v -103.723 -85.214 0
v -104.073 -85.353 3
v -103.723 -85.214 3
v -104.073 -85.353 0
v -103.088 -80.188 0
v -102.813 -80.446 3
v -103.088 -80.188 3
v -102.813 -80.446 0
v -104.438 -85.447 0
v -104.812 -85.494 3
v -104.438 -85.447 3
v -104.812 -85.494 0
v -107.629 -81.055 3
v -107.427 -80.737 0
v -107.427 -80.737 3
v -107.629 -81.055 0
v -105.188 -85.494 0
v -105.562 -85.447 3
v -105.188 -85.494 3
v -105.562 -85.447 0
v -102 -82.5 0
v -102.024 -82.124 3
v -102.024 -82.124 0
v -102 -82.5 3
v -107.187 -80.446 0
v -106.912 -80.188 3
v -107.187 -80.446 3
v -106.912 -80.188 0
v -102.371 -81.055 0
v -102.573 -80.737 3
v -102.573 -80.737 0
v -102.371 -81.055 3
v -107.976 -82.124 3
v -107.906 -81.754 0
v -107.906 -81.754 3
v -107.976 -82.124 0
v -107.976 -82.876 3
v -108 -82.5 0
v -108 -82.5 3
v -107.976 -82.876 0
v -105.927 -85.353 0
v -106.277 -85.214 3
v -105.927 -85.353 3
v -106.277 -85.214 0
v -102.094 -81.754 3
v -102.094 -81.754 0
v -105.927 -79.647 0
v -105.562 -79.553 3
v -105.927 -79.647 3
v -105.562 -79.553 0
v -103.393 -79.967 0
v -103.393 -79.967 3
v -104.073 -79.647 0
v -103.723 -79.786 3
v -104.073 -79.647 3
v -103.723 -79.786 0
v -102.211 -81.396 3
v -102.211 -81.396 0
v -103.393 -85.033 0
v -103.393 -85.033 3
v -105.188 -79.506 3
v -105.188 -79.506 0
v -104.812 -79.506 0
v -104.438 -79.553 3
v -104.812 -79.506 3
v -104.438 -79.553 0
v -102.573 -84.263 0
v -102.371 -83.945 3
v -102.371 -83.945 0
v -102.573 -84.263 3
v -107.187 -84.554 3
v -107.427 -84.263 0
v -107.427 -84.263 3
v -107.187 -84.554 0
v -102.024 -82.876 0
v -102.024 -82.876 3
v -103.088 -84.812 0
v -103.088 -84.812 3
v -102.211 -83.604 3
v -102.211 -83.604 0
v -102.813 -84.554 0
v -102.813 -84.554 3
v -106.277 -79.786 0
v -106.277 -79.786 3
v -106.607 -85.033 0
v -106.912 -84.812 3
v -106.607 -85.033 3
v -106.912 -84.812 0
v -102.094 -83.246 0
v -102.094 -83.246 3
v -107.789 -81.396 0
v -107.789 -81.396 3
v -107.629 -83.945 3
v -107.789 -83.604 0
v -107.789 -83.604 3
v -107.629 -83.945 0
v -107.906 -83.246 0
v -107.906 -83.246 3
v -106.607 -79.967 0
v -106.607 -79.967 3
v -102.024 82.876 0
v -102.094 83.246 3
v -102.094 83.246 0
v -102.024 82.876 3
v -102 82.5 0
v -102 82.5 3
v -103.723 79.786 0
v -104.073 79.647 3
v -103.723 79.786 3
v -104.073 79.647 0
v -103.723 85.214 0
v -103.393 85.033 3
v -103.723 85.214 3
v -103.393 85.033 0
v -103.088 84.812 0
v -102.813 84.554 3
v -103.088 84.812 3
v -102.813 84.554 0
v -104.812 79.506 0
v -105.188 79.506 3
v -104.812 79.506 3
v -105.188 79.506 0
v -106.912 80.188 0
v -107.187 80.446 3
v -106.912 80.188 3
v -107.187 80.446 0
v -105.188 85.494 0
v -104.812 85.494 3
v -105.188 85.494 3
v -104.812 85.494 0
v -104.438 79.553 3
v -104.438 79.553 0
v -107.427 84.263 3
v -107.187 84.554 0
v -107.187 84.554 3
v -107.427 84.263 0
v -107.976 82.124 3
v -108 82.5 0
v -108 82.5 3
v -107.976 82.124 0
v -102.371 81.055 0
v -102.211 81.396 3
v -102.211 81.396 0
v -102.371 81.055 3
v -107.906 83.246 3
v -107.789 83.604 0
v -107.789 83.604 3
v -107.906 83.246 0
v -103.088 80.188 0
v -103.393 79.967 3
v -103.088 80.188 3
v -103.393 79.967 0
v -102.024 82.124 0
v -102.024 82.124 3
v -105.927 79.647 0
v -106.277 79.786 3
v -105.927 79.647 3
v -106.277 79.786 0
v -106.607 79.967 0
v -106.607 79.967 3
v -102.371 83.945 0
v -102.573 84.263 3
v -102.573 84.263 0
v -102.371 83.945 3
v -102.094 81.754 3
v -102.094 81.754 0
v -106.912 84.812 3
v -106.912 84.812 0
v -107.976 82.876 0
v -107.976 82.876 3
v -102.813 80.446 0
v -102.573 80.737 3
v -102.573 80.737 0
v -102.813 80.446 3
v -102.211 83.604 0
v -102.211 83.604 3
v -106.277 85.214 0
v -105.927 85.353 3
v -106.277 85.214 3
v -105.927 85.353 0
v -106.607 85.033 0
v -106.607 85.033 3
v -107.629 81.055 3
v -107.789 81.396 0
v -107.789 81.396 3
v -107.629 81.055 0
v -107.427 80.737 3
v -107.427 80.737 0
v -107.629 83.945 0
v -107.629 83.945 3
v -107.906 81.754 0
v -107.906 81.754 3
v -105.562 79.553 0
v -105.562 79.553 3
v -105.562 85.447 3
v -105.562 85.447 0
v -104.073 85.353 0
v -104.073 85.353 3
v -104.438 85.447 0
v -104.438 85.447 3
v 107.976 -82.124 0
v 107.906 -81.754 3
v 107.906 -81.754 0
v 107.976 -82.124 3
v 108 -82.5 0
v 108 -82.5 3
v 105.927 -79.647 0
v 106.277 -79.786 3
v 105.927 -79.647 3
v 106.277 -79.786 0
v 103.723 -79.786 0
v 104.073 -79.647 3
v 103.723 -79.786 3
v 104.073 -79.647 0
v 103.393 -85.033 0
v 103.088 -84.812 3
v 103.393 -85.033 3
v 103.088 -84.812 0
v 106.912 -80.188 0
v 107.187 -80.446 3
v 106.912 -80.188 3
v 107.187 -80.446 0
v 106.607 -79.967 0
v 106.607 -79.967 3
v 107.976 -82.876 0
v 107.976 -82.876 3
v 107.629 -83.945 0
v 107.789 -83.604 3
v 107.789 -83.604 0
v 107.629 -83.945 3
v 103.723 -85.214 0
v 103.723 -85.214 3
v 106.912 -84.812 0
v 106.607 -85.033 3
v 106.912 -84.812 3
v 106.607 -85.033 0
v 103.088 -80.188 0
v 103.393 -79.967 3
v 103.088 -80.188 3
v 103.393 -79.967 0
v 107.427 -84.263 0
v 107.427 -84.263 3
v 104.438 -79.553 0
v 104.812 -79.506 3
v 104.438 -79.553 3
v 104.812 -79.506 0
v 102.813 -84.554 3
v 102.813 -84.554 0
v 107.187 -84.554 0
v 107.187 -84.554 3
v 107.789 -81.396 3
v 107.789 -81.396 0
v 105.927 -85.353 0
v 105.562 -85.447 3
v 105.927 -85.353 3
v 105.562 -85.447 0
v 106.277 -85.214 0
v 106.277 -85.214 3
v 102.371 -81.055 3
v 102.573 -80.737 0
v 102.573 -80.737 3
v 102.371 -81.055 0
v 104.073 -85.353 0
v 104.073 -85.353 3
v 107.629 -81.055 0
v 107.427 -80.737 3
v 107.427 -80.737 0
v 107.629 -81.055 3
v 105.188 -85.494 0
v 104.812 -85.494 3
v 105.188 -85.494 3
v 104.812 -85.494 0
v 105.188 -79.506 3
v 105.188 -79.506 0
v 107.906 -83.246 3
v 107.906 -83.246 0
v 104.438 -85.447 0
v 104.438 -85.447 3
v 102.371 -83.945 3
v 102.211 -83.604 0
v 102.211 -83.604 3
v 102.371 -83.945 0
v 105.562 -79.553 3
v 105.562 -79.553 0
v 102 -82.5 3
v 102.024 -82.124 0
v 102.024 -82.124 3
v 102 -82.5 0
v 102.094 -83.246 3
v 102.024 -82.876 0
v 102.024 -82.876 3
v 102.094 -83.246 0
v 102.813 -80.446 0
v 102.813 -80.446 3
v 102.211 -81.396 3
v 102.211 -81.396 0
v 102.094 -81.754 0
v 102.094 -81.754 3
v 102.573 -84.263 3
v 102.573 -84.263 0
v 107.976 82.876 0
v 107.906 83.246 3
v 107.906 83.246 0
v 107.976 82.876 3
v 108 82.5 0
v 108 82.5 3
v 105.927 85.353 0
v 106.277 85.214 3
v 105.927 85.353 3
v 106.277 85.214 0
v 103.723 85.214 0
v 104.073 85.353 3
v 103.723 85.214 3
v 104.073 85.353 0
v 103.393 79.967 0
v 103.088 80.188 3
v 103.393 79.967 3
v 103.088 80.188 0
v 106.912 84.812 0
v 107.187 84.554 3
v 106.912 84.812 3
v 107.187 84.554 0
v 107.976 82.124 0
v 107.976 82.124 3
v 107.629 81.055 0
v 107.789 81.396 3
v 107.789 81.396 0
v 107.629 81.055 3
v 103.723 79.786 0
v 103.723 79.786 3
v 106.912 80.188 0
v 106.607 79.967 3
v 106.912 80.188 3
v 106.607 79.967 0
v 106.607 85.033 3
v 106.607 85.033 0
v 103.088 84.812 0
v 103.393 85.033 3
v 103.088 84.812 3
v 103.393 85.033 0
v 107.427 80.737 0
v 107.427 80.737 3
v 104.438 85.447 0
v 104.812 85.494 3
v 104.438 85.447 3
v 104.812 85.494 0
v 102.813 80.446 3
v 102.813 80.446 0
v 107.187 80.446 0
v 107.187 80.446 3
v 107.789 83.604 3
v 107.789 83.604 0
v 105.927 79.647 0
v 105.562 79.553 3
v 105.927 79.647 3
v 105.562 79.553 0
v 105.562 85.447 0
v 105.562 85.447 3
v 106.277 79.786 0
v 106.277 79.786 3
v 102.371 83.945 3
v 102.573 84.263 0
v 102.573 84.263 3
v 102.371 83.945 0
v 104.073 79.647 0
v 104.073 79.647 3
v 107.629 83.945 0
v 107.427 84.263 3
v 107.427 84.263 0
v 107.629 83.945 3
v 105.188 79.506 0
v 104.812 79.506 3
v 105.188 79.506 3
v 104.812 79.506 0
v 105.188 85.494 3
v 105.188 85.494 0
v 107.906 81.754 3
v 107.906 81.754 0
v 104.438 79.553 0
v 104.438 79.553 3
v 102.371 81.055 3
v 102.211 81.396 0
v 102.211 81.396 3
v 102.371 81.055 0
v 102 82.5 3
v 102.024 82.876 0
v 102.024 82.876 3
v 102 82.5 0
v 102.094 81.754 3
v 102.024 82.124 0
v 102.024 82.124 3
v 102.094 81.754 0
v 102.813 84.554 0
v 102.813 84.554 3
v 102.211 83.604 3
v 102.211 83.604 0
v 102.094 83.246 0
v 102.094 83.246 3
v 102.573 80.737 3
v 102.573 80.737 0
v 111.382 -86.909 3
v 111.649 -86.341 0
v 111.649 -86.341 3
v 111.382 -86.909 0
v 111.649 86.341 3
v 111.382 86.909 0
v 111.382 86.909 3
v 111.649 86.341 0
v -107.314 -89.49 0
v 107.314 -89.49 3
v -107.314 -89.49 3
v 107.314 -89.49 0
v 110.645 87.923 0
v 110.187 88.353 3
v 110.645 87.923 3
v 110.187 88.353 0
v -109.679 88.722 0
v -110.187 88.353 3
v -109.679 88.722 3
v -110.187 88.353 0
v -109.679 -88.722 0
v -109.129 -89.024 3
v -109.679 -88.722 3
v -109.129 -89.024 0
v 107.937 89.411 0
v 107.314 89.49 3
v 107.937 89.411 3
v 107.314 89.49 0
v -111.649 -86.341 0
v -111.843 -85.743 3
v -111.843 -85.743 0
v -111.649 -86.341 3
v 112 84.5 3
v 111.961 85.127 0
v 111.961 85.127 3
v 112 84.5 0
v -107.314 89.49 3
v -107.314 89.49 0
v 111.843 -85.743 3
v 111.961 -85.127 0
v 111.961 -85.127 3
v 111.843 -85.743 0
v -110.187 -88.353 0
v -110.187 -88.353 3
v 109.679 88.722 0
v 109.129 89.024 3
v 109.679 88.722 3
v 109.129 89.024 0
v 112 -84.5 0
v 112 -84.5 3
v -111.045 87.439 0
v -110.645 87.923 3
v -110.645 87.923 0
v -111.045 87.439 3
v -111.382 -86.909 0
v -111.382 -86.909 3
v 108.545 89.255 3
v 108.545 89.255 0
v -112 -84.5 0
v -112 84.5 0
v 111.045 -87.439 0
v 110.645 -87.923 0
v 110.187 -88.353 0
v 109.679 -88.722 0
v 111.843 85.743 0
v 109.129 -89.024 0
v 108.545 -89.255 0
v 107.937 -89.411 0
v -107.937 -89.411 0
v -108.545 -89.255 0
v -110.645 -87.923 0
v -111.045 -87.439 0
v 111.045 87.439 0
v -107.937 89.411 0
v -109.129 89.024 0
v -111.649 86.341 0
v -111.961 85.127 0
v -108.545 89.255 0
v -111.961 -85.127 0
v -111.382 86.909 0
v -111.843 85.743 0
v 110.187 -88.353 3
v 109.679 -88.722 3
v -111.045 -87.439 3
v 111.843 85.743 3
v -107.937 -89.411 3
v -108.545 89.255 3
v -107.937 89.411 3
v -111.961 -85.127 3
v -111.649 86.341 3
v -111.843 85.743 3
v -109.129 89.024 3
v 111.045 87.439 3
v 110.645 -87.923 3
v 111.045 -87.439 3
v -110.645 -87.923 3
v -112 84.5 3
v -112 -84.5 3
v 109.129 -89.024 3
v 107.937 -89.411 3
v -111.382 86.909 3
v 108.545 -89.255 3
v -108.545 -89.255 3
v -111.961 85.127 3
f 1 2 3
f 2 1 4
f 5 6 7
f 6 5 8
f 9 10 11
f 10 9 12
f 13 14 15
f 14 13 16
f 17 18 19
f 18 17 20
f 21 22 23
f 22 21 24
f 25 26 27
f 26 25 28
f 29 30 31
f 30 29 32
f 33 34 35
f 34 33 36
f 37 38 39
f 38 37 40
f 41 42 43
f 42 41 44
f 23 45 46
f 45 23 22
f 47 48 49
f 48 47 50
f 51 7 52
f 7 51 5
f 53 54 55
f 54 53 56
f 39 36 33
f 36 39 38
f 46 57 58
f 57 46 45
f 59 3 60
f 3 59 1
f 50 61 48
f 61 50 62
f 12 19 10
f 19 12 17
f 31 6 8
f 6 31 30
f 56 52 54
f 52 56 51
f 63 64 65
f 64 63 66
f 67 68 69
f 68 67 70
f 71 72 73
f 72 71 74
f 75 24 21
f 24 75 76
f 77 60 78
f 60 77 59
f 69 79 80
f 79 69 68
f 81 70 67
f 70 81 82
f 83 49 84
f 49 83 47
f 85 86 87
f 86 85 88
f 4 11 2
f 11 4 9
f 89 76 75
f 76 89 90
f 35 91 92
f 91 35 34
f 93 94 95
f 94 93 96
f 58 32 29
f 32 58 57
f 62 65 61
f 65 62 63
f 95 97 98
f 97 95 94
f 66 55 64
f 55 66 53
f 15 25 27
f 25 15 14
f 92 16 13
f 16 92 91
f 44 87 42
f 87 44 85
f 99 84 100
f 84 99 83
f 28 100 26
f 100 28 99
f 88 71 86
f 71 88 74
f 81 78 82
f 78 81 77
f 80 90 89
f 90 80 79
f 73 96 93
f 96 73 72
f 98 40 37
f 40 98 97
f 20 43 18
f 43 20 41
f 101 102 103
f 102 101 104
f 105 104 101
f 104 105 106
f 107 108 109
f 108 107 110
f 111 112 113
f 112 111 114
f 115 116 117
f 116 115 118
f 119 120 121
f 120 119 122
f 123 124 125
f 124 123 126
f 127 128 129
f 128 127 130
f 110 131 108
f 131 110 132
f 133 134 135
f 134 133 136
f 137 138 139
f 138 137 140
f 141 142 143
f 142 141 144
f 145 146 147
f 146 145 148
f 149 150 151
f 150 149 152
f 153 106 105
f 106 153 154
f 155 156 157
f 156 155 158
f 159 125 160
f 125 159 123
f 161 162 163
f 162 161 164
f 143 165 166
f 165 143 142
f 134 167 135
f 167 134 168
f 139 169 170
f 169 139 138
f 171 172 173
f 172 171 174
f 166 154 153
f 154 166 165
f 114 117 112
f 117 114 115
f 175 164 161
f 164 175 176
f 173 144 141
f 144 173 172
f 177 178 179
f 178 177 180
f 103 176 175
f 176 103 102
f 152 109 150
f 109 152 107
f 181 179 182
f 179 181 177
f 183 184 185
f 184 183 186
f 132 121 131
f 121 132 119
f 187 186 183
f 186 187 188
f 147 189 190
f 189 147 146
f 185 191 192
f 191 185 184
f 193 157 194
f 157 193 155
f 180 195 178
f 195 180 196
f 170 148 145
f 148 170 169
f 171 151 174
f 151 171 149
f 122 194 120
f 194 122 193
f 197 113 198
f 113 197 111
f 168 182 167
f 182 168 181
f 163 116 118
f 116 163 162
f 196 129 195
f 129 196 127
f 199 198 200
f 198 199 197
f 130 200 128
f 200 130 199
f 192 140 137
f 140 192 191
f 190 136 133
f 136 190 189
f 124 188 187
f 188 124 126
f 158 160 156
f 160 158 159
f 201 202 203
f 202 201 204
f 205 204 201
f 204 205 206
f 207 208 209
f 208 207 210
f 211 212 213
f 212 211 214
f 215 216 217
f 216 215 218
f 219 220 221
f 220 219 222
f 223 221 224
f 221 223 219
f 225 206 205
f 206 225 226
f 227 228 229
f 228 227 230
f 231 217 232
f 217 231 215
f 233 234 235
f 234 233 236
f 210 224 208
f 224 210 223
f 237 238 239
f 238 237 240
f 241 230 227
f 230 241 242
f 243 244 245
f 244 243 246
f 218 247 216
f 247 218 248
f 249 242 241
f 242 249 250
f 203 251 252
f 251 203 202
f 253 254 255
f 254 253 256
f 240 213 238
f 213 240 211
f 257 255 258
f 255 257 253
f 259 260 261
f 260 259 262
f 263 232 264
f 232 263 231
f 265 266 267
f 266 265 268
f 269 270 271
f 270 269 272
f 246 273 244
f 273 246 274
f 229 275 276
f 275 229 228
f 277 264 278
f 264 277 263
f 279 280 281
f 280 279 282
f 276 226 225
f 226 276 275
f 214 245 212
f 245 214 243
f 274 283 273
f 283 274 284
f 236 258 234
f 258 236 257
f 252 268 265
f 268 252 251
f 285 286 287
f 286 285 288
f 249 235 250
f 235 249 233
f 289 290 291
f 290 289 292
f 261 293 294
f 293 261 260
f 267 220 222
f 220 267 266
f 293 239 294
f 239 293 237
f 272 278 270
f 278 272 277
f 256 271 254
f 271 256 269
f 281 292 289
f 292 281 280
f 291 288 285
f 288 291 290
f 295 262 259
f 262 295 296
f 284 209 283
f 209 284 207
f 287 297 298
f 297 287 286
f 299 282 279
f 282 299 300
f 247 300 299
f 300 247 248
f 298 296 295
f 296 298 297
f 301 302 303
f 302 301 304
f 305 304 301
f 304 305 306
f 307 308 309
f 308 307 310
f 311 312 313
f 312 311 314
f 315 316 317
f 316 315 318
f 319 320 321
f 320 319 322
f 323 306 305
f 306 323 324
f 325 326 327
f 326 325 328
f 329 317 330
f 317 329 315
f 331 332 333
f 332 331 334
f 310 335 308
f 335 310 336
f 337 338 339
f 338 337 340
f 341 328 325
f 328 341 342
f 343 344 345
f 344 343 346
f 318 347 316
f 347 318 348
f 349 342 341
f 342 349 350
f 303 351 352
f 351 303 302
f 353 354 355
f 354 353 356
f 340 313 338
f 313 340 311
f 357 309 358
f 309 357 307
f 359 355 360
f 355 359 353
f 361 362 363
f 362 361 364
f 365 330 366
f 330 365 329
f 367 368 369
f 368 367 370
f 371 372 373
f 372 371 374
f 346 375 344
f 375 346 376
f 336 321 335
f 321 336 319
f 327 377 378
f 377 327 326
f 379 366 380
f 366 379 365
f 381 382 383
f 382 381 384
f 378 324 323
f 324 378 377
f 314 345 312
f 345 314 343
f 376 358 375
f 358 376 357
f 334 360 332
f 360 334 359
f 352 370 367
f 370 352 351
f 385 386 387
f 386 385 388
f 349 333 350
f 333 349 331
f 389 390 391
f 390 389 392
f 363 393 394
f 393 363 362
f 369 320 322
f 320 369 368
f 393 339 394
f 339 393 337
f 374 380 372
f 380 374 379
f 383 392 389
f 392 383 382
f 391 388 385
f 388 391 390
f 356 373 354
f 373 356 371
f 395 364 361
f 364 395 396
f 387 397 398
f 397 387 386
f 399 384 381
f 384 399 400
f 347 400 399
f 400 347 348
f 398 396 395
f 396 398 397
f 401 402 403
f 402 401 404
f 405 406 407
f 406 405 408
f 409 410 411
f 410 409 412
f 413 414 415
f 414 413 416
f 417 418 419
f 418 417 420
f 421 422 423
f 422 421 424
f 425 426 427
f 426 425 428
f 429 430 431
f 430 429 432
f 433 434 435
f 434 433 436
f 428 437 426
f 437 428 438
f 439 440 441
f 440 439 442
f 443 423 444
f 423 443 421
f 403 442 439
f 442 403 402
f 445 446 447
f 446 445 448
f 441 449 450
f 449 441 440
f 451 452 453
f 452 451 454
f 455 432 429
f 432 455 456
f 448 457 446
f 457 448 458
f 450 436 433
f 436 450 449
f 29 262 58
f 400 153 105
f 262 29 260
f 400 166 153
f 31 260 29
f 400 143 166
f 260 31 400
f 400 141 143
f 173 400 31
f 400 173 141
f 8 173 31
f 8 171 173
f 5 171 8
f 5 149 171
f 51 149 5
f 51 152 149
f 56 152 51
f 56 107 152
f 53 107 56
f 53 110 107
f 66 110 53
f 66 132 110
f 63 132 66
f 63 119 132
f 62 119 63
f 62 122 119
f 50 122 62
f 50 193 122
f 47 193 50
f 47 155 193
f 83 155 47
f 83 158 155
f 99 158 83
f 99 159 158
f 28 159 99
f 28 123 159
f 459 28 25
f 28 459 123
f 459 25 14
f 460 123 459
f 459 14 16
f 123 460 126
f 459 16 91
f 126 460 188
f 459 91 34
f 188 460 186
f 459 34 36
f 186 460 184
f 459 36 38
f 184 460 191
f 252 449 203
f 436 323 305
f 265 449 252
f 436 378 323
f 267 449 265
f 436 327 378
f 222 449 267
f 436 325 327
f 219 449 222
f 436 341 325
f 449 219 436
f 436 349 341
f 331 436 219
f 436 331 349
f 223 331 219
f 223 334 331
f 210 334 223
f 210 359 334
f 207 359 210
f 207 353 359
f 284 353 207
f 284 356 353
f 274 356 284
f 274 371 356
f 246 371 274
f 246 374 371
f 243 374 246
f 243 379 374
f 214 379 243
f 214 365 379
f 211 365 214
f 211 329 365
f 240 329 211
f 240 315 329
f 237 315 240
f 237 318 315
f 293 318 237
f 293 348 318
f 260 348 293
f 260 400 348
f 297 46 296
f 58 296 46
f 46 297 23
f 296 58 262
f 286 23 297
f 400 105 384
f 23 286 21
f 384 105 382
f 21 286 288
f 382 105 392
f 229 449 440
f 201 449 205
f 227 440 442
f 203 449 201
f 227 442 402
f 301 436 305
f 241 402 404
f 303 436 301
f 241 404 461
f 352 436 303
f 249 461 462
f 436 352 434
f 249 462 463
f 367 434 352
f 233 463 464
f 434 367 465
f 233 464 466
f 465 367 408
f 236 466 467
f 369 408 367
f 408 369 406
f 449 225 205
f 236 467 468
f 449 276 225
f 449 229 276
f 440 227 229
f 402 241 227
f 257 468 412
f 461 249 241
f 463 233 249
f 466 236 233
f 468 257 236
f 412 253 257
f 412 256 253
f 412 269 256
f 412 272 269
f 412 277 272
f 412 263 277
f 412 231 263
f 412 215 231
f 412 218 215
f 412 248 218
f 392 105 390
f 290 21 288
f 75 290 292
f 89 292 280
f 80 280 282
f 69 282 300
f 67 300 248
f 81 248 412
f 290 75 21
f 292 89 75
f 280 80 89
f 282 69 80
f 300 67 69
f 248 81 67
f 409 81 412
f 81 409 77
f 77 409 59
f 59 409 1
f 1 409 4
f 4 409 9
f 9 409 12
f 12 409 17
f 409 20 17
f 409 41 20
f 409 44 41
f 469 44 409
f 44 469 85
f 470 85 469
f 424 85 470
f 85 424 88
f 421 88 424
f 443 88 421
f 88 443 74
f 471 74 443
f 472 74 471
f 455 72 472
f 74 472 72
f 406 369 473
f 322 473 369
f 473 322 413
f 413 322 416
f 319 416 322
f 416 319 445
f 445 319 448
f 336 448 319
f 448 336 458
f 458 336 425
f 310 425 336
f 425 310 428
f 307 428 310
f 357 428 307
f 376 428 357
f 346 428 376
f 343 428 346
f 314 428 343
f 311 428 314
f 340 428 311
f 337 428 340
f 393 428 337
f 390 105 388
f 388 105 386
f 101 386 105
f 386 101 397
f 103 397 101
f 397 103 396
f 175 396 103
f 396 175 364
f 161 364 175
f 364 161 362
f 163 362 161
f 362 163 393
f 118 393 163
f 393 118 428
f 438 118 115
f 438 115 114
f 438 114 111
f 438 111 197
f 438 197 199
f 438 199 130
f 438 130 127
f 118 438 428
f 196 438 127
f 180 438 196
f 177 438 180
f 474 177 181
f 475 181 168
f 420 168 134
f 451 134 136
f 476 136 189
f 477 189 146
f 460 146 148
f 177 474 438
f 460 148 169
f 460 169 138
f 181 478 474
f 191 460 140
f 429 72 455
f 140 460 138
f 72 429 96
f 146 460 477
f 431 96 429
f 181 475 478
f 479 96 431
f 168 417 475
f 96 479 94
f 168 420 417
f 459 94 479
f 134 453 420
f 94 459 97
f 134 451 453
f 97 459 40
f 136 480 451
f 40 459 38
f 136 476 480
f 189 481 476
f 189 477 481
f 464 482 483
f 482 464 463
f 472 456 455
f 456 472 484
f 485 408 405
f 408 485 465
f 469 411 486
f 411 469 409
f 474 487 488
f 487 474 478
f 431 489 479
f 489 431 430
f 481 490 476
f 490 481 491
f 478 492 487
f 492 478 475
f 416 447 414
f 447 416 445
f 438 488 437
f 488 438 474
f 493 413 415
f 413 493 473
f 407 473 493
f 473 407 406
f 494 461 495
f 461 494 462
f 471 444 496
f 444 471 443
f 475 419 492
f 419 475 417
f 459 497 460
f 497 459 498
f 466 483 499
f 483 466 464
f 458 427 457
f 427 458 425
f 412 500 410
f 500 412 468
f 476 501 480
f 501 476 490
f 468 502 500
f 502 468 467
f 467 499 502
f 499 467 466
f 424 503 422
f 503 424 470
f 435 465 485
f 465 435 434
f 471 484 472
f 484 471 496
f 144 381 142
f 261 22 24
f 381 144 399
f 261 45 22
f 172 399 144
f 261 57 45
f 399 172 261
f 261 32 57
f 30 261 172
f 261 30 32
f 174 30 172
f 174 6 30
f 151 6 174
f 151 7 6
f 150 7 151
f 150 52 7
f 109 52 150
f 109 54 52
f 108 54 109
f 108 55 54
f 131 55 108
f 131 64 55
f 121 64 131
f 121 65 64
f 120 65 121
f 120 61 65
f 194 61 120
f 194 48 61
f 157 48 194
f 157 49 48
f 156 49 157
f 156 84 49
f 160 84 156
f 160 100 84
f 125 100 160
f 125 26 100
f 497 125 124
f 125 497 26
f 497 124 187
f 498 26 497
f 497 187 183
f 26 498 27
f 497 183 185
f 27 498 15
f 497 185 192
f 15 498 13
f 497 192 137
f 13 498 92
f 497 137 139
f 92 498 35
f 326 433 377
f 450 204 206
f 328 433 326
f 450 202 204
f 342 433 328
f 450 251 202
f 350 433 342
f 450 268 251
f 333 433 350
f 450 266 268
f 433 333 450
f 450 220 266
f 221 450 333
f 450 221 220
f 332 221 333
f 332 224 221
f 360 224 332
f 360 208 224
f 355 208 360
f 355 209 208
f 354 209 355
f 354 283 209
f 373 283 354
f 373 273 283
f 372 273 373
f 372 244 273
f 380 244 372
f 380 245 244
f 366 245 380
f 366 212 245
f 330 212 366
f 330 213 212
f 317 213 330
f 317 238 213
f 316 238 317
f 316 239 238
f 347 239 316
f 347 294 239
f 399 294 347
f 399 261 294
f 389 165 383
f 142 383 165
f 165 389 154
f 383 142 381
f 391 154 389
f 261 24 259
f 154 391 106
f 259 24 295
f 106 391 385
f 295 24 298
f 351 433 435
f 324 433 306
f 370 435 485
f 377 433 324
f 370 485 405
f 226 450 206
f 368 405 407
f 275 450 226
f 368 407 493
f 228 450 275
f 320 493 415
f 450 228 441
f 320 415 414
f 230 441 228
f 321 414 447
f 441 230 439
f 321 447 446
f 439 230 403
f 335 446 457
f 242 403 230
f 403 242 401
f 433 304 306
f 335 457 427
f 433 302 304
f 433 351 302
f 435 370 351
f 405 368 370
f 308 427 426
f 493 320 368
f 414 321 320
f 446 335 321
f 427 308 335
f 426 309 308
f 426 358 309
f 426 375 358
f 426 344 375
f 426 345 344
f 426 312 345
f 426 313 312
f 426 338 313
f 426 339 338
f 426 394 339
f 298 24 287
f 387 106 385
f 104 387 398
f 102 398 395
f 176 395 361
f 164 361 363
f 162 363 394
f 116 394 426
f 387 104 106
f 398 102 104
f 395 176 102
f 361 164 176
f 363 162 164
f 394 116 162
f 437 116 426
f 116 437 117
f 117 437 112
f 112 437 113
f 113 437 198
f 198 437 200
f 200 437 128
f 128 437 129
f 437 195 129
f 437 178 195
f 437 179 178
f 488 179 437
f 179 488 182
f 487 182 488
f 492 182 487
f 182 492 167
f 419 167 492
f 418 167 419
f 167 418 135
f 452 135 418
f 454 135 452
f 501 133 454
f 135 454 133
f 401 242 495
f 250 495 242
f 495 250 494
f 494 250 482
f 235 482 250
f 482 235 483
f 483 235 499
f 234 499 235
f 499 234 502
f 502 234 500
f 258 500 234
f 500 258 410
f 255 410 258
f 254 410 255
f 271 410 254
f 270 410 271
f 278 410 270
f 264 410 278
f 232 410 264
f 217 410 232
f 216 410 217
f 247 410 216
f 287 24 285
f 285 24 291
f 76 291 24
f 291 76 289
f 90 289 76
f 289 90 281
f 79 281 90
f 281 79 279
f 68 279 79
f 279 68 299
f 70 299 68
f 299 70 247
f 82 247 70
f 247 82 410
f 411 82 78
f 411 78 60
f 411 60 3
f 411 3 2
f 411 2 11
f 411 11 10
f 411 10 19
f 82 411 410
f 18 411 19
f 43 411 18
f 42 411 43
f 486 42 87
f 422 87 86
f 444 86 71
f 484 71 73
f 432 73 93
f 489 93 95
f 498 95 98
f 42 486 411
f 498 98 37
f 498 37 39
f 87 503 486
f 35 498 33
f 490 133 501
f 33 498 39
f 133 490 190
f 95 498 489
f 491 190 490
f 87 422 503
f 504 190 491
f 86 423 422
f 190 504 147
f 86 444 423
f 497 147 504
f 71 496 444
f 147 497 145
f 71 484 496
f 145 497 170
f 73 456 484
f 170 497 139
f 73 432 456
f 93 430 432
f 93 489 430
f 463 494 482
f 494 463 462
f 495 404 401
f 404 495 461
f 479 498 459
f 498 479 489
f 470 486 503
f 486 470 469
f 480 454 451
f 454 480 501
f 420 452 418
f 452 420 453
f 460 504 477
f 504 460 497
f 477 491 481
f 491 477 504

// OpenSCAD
$fn = 50;


difference() {
	union() {
		hull() {
			translate(v = [-107.0000000000, 84.5000000000, 0]) {
				cylinder(h = 3, r = 5);
			}
			translate(v = [107.0000000000, 84.5000000000, 0]) {
				cylinder(h = 3, r = 5);
			}
			translate(v = [-107.0000000000, -84.5000000000, 0]) {
				cylinder(h = 3, r = 5);
			}
			translate(v = [107.0000000000, -84.5000000000, 0]) {
				cylinder(h = 3, r = 5);
			}
		}
	}
	union() {
		translate(v = [-105.0000000000, -82.5000000000, -100.0000000000]) {
			cylinder(h = 200, r = 3.0000000000);
		}
		translate(v = [-105.0000000000, 82.5000000000, -100.0000000000]) {
			cylinder(h = 200, r = 3.0000000000);
		}
		translate(v = [105.0000000000, -82.5000000000, -100.0000000000]) {
			cylinder(h = 200, r = 3.0000000000);
		}
		translate(v = [105.0000000000, 82.5000000000, -100.0000000000]) {
			cylinder(h = 200, r = 3.0000000000);
		}
	}
}
